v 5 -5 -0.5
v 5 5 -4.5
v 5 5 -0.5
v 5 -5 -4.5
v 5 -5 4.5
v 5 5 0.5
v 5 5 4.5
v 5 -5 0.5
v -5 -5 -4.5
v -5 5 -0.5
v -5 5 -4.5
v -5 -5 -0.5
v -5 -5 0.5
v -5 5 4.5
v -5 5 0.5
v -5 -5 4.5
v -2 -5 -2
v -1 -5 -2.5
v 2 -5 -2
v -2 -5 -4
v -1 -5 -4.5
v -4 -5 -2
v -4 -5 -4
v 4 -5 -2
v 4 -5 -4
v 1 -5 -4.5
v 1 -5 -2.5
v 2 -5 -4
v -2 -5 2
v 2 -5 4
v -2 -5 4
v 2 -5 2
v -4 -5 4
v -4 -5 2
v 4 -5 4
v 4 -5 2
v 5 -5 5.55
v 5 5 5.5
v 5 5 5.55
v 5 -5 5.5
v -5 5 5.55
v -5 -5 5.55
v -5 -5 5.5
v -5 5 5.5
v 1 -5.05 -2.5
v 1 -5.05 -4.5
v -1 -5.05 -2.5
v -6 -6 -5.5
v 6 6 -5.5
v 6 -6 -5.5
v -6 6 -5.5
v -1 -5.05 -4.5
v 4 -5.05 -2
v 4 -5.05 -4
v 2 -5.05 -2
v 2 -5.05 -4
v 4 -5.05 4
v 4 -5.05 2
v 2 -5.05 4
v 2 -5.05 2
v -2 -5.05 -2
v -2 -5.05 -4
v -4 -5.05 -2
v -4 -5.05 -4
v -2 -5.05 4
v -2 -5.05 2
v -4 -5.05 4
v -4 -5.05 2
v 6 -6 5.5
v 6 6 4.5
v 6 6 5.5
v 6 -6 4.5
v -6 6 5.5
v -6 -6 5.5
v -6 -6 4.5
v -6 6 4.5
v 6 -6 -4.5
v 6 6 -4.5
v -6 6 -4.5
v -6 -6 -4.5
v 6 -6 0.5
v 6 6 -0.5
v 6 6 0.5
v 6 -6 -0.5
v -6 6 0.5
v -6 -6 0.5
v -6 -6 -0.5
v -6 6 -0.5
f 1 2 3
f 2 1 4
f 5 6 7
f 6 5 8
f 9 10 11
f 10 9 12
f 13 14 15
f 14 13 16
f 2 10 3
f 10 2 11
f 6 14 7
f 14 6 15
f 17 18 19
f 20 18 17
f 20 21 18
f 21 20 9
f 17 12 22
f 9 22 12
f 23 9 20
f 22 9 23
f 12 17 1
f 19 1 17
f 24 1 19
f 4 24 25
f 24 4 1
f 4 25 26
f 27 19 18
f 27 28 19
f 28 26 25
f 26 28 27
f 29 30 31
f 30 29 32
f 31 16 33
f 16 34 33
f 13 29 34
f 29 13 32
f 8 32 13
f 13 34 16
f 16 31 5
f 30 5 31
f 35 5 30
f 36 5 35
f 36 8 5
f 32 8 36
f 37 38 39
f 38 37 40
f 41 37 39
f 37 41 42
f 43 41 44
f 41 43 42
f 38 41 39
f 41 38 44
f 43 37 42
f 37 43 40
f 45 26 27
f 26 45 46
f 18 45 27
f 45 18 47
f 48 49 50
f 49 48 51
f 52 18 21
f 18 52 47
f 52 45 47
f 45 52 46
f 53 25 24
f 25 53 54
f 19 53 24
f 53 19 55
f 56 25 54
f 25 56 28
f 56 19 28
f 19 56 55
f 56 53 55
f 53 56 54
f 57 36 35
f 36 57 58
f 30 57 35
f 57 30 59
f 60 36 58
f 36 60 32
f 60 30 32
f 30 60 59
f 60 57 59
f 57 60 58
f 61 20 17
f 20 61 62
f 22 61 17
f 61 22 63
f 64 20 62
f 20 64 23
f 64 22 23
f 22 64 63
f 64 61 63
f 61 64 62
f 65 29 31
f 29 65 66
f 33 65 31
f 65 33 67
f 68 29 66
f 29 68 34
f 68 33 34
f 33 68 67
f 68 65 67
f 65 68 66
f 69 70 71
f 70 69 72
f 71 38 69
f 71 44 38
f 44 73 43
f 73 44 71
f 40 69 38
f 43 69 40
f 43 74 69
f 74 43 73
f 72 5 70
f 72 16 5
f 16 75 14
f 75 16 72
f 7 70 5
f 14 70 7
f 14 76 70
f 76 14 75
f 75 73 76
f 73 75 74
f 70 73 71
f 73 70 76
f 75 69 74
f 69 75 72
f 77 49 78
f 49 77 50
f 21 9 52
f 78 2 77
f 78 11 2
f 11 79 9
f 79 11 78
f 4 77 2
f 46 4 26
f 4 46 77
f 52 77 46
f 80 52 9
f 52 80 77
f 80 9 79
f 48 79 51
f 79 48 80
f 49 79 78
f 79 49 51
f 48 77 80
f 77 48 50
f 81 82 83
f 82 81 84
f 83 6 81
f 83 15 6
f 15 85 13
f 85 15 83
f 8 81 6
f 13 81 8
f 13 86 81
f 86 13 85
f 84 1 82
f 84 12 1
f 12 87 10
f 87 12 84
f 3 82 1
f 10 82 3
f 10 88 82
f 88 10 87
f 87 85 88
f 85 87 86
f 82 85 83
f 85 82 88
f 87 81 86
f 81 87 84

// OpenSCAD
module Building_02() {
 
    module door(door_size =[10,10,10] , coord =[0,0,0]){
      color("#a59f8b")
      translate([coord[0],coord[1],coord[2]])
      cube([door_size[0],door_size[1],door_size[2]], center= true);
    }
    
    
    union(){
    color("#132919")
    cube([10,10,10],center=true);
    
    
    translate([0,0,5.5])
    color("#d1c093")
    cube([10,10,0.1],center=true);
    
    // Doors
    color("#a59f8b")
    translate([0,-5,-4])
    cube([2,0.1,3],center=true);
    
    
    // Windows
    translate([3,-5,-3]){
    color("#9fcbd0")
    cube([2,0.1,2],center=true);
    }
    
    translate([3,-5,3]){
    color("#9fcbd0")
    cube([2,0.1,2],center=true);
    }
    
    translate([-3,-5,-3]){
    color("#9fcbd0")
    cube([2,0.1,2],center=true);
    }
    
    translate([-3,-5,3]){
    color("#9fcbd0")
    cube([2,0.1,2],center=true);
    }
     
    // Roof
    translate([0,0,5])
    color("#a59f8b")
    cube([12,12,1],center=true);
    
    translate([0,0,-5]){
    color("#a59f8b")
    cube([12,12,1],center=true);
    }
    
    translate([0,0,0]){
    color("#a59f8b")
    cube([12,12,1],center=true);
    }
    
    }
}

Building_02();


// Written by Nicolì Angelo (Gengio) 2024: 
// MIT License

//Permission is hereby granted, free of charge, to any person obtaining a copy of this software and associated documentation files (the "Software"), to deal in the Software without restriction, including without limitation the rights to use, copy, modify, merge, publish, distribute, sublicense, and/or sell copies of the Software, and to permit persons to whom the Software is furnished to do so, subject to the following conditions:

//The above copyright notice and this permission notice shall be included in all copies or substantial portions of the Software.

//THE SOFTWARE IS PROVIDED "AS IS", WITHOUT WARRANTY OF ANY KIND, EXPRESS OR IMPLIED, INCLUDING BUT NOT LIMITED TO THE WARRANTIES OF MERCHANTABILITY, FITNESS FOR A PARTICULAR PURPOSE AND NONINFRINGEMENT. IN NO EVENT SHALL THE AUTHORS OR COPYRIGHT HOLDERS BE LIABLE FOR ANY CLAIM, DAMAGES OR OTHER LIABILITY, WHETHER IN AN ACTION OF CONTRACT, TORT OR OTHERWISE, ARISING FROM, OUT OF OR IN CONNECTION WITH THE SOFTWARE OR THE USE OR OTHER DEALINGS IN THE SOFTWARE.
